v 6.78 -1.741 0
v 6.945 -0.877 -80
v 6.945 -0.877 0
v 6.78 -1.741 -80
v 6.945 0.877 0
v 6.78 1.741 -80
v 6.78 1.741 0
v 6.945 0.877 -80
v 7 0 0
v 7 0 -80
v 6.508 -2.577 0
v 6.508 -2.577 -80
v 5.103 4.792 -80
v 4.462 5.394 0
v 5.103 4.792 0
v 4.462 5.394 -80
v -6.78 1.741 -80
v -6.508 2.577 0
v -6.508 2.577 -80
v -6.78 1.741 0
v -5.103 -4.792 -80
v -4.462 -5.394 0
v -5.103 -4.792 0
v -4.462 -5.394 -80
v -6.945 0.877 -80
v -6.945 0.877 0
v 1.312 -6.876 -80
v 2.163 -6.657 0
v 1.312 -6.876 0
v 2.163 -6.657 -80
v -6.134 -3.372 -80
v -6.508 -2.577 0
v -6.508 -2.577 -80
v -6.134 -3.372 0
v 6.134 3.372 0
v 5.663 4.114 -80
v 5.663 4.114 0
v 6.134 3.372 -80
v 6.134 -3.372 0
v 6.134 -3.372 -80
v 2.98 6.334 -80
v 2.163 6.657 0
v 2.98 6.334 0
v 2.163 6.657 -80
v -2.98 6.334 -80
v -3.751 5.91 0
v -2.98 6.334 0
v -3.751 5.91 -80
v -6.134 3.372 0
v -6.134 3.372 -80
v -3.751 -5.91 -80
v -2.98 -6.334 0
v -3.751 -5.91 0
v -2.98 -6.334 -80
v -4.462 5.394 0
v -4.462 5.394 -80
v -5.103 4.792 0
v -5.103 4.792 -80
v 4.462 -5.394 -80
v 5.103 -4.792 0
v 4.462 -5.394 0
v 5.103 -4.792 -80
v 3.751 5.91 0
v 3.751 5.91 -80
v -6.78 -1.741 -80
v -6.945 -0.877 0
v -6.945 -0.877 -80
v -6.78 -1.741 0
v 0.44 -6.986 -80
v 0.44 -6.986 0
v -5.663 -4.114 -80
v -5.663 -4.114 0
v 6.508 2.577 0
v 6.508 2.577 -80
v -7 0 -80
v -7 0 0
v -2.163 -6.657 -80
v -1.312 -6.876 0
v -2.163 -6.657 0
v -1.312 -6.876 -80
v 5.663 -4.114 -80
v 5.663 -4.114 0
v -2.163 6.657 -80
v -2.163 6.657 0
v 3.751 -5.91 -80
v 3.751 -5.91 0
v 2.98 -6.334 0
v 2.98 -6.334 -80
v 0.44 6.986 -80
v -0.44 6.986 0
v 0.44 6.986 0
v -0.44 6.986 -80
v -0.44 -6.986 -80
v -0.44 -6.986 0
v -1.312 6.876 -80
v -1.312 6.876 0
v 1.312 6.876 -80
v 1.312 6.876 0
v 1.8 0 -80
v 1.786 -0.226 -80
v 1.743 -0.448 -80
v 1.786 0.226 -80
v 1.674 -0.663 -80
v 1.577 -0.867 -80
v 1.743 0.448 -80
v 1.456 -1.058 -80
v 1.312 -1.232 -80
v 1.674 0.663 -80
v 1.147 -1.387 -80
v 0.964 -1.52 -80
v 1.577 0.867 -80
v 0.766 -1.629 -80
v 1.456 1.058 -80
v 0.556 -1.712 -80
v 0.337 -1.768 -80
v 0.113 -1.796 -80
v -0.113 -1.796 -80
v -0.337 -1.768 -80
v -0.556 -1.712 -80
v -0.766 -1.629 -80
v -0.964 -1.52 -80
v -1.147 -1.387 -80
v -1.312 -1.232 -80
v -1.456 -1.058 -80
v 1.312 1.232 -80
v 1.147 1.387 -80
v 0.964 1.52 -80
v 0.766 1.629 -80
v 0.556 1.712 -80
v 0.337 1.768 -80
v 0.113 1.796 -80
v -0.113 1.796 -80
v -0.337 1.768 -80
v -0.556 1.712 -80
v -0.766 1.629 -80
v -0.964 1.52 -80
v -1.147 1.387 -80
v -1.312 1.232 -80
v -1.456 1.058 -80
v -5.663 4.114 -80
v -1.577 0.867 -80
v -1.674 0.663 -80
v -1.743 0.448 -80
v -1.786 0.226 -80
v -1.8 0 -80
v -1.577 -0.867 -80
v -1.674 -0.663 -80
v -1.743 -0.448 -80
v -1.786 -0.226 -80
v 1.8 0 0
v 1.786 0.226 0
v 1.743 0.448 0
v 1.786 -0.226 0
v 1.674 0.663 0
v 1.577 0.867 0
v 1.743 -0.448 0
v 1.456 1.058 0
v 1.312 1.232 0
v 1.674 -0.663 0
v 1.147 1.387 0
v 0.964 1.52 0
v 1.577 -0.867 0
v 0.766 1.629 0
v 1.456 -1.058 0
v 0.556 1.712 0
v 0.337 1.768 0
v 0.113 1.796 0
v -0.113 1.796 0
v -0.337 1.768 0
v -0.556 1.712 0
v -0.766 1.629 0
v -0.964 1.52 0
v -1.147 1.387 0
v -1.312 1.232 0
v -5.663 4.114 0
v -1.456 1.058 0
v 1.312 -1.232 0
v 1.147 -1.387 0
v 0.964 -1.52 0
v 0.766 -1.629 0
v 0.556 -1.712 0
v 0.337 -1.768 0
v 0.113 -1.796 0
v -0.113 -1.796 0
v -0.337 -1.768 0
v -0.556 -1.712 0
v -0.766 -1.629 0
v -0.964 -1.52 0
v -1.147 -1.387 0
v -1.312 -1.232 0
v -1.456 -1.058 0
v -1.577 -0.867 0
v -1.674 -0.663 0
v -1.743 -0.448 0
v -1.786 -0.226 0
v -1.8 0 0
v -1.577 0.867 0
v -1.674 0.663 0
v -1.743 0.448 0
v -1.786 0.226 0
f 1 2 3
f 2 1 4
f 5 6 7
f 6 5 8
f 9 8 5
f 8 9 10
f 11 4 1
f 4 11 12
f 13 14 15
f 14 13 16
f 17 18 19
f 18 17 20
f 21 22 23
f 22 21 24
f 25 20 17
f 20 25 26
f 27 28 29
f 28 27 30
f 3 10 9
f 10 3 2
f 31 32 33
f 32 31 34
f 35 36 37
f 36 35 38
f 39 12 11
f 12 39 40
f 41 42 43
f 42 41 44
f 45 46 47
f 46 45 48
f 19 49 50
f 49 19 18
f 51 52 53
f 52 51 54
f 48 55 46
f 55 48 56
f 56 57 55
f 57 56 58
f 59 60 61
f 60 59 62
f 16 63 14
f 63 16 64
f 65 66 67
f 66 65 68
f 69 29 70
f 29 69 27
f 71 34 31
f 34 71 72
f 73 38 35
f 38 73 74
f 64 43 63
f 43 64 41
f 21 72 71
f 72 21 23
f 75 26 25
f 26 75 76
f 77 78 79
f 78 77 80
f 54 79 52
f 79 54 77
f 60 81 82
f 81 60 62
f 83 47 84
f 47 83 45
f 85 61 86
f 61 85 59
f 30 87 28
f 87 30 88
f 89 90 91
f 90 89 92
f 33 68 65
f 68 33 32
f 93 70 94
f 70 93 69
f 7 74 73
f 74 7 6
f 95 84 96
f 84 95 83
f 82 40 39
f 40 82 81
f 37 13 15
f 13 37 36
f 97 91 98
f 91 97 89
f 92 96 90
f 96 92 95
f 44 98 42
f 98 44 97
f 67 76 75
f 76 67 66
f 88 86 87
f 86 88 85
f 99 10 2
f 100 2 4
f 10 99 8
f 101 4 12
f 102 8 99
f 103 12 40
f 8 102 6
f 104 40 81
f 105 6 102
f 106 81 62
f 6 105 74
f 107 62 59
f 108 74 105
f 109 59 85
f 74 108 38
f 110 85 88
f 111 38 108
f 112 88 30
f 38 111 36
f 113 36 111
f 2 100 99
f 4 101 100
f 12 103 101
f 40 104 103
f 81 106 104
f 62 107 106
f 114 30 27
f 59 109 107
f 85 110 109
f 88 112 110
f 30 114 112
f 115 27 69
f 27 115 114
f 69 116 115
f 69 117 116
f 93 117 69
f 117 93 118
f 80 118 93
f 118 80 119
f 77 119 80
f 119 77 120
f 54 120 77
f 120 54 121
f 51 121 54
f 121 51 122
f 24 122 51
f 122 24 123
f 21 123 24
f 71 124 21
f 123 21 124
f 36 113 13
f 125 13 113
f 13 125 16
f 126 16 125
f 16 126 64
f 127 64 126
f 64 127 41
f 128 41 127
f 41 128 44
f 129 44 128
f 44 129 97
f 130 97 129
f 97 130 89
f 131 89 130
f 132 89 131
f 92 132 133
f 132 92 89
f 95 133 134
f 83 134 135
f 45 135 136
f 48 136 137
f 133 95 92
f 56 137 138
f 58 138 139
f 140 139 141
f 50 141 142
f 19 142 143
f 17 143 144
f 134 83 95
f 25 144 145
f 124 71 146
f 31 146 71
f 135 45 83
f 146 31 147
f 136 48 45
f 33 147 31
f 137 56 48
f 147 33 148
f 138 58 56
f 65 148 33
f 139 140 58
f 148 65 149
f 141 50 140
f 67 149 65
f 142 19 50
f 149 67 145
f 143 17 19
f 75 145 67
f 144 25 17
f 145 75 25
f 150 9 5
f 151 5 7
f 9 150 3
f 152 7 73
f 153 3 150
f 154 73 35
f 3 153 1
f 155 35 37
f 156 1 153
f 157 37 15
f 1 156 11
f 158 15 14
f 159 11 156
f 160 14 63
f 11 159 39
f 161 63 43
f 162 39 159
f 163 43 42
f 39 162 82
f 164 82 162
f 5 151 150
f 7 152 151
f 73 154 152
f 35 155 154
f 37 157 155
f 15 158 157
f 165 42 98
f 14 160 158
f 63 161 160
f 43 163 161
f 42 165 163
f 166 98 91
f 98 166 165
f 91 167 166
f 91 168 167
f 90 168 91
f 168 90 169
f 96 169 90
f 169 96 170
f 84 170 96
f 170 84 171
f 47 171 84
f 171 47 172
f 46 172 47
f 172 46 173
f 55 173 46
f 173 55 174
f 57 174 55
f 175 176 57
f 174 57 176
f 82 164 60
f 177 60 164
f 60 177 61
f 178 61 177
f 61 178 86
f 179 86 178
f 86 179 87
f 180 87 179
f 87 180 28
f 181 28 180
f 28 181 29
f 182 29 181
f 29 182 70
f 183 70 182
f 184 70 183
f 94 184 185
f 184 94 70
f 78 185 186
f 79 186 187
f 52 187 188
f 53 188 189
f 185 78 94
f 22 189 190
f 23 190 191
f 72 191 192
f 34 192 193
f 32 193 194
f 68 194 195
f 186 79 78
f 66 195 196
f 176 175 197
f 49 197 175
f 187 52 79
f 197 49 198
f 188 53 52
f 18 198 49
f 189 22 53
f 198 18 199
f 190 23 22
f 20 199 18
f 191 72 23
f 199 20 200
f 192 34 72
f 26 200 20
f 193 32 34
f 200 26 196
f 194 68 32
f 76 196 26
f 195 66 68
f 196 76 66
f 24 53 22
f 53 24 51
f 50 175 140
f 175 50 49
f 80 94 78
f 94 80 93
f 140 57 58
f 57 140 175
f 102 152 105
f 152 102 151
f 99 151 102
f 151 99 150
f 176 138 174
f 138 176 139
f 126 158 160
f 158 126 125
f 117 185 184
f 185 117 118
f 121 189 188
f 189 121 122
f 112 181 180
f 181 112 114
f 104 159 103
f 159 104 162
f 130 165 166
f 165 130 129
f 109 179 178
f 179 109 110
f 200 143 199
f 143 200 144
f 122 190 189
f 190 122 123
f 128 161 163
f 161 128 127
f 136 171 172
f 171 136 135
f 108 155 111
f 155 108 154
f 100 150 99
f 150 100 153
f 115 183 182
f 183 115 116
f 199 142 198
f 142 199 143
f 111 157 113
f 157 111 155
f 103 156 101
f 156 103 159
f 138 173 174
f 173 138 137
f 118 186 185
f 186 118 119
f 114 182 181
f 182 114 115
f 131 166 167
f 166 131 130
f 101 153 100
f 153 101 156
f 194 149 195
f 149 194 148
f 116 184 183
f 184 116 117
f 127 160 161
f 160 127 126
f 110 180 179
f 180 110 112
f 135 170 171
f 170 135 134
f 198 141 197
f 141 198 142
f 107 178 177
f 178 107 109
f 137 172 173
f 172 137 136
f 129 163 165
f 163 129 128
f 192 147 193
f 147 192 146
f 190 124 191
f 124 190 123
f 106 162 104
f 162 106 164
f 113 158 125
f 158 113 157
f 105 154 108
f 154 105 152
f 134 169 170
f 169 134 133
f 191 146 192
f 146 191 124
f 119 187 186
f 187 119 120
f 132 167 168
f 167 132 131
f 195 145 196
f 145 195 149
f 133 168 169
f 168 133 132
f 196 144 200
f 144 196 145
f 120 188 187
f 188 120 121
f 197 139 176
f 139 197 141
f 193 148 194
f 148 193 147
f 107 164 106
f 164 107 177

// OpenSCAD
$fn = 50;


difference() {
	union() {
		translate(v = [0, 0, -80.0000000000]) {
			cylinder(h = 80, r = 7.0000000000);
		}
	}
	union() {
		#translate(v = [0, 0, -80]) {
			cylinder(h = 80, r = 1.8000000000);
		}
	}
}
